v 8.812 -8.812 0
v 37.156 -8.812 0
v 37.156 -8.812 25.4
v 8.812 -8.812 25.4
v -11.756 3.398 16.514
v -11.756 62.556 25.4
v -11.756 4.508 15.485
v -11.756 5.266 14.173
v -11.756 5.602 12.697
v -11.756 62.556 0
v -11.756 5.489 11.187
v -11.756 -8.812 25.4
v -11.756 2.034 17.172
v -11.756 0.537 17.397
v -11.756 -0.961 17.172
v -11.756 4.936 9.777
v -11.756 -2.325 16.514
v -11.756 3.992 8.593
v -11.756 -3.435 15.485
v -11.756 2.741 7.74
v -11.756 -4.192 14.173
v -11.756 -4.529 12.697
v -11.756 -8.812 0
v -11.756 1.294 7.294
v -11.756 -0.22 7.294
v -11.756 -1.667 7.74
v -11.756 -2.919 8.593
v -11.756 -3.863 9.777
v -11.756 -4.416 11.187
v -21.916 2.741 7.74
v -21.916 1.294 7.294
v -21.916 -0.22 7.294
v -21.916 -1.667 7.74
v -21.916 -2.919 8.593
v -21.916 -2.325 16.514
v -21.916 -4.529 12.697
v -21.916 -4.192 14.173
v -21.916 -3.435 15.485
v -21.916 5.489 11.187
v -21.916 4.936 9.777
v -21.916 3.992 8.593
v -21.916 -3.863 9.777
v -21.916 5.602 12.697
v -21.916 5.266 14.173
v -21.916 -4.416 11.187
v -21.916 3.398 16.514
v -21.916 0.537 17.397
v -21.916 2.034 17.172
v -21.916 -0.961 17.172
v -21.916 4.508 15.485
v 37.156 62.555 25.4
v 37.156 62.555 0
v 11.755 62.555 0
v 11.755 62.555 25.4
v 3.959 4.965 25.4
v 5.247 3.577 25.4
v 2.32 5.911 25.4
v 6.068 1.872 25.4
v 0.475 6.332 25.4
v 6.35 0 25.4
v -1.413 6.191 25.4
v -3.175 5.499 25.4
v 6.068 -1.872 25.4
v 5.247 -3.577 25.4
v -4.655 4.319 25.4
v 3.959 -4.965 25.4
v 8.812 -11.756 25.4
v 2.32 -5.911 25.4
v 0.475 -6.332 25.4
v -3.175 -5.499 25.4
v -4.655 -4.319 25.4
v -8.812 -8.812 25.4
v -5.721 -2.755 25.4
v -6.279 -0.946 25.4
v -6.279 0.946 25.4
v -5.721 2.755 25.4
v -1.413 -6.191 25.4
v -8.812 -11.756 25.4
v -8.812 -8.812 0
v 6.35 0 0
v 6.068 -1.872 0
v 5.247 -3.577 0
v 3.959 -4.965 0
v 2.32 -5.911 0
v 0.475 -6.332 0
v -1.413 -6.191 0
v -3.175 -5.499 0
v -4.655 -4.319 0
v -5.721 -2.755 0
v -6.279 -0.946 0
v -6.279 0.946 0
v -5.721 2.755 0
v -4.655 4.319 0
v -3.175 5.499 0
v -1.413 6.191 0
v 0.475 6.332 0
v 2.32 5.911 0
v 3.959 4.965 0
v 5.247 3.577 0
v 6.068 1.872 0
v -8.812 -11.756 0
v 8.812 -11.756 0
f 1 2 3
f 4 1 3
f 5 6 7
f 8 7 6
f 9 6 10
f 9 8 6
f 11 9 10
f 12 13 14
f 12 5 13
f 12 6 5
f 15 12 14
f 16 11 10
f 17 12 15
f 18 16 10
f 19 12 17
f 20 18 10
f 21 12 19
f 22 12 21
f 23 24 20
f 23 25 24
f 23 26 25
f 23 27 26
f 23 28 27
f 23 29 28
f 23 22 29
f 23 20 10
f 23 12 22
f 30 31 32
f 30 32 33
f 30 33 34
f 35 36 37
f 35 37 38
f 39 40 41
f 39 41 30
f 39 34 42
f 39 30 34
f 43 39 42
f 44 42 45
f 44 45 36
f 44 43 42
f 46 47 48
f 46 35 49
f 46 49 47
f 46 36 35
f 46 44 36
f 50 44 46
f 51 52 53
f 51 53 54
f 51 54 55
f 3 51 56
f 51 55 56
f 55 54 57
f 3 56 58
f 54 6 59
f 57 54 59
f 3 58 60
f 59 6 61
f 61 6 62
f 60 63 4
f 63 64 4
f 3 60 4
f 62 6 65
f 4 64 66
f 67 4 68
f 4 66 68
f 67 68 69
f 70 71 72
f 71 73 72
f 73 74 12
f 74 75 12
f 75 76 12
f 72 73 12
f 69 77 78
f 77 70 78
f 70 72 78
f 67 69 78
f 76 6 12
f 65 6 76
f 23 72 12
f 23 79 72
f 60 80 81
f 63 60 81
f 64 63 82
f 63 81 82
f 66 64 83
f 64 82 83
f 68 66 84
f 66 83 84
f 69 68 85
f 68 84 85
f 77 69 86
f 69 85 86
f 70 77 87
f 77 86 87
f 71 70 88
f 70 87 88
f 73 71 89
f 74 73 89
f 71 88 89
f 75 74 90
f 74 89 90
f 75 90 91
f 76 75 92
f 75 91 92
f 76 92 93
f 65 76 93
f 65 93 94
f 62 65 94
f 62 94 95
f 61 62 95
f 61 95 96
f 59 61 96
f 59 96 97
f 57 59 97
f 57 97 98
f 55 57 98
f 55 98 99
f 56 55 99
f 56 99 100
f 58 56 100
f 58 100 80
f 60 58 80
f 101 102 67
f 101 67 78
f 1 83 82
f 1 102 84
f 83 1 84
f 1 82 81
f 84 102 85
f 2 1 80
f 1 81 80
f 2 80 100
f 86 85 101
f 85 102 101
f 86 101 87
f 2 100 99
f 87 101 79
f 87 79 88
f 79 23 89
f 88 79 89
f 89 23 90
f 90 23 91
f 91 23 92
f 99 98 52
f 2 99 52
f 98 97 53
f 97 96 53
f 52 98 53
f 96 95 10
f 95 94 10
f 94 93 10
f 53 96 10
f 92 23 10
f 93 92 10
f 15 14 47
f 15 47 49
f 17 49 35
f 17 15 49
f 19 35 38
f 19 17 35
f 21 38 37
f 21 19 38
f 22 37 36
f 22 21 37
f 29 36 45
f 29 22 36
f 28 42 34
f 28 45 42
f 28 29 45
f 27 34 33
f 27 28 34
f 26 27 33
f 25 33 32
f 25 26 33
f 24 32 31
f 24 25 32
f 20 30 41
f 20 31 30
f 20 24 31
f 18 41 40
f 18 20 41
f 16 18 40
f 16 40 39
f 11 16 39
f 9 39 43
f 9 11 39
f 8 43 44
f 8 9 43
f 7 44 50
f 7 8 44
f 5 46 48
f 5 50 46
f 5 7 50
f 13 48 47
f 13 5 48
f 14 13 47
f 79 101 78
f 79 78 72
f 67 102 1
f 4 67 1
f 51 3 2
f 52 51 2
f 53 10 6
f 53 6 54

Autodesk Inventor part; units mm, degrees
ref_plane "YZ Plane" through (0, 0, 0) normal (1, 0, 0) x (0, 1, 0)
ref_plane "XZ Plane" through (0, 0, 0) normal (0, 1, 0) x (-1, 0, 0)
ref_plane "XY Plane" through (0, 0, 0) normal (0, 0, 1) x (1, 0, 0)
sketch "Sketch1" plane through (0, 0, 0) normal (0, 0, 1) x (1, 0, 0)
  line L0 (-11.7555, 11.7555) -> (11.7555, 11.7555)
  line L1 (11.7555, 11.7555) -> (11.7555, -8.812)
  line L2 (8.812, -11.7555) -> (-8.812, -11.7555)
  line L3 (-11.7555, -8.812) -> (-11.7555, 11.7555)
  line L4 (-11.7555, 11.7555) -> (11.7555, -11.7555) construction
  line L5 (11.7555, 11.7555) -> (-11.7555, -11.7555) construction
  line L6 (11.7555, -11.7555) -> (8.812, -11.7555)
  line L7 (8.812, -11.7555) -> (8.812, -8.812)
  line L8 (8.812, -8.812) -> (11.7555, -8.812)
  line L9 (11.7555, -8.812) -> (11.7555, -11.7555)
  line L10 (-8.812, -11.7555) -> (-8.812, -8.812)
  line L11 (-8.812, -8.812) -> (-11.7555, -8.812)
  circle A0 centre (0, 0) radius 6.35
  point P0 (0, 0)
  dimension "d4" = 12.7
extrude "Extrusion1" add sketch "Sketch1" along normal blind 25.4 contours L0 L1 L8 L7 L2 L10 L11 L3
mirror "Mirror1" about plane through (0, 0, 0) normal (1, 0, 0)
sketch "Sketch3" plane through (-11.7555, -8.812, 0) normal (-1, 0, 0) x (0, 0, 1)
  circle A0 centre (12.3172, 9.3487) radius 5.08
  point P0 (0, 8.812)
  dimension "d13" = 10.16
extrude "Extrusion3" add sketch "Sketch3" along normal blind 10.16
sketch "Sketch4" plane through (-11.7555, 11.7555, 0) normal (0, 1, 0) x (1, 0, 0)
  line L0 (23.5109, 0) -> (23.5109, -25.4) projected
  line L1 (0, 0) -> (2.9435, 0) projected
  line L2 (23.5109, -25.4) -> (0, -25.4)
  line L3 (0, -25.4) -> (0, 0)
  line L4 (0, 0) -> (23.5109, 0)
  line L5 (23.5109, 0) -> (23.5109, -25.4)
  point P0 (11.7555, 0)
  point P1 (2.9435, 0)
extrude "Extrusion4" add sketch "Sketch4" along normal blind 50.8
sketch "Sketch5" plane through (11.7555, -8.812, 25.4) normal (1, 0, 0) x (0, 0, -1)
  line L0 (25.4, 0) -> (0, 0) projected
  line L1 (25.4, 0) -> (25.4, 71.3674) projected
  line L2 (0, 0) -> (25.4, 0)
  line L3 (25.4, 0) -> (25.4, 71.3674)
  line L4 (25.4, 71.3674) -> (0, 71.3674)
  line L5 (0, 71.3674) -> (0, 0)
  point P0 (25.4, 8.812)
extrude "Extrusion5" add sketch "Sketch5" along normal blind 25.4
ref_plane "Work Plane1" through (0, 0, 0) normal (1, 0, 0) x (0, 1, 0)
equation "\"BendRadius\" = Thickness"
equation "\"BendReliefWidth\" = Thickness"
equation "\"BendReliefDepth\" = 0.5 * Thickness"
equation "\"CornerReliefSize\" = 4 * Thickness"
equation "\"MinimumRemnant\" = 2 * Thickness"
equation "\"TransitionRadius\" = BendRadius"
equation "\"JacobiRadiusSize\" = BendRadius"
equation "\"GapSize\" = Thickness"
equation "\"Thickness\" = 3.048"
properties part number "new slider part"
